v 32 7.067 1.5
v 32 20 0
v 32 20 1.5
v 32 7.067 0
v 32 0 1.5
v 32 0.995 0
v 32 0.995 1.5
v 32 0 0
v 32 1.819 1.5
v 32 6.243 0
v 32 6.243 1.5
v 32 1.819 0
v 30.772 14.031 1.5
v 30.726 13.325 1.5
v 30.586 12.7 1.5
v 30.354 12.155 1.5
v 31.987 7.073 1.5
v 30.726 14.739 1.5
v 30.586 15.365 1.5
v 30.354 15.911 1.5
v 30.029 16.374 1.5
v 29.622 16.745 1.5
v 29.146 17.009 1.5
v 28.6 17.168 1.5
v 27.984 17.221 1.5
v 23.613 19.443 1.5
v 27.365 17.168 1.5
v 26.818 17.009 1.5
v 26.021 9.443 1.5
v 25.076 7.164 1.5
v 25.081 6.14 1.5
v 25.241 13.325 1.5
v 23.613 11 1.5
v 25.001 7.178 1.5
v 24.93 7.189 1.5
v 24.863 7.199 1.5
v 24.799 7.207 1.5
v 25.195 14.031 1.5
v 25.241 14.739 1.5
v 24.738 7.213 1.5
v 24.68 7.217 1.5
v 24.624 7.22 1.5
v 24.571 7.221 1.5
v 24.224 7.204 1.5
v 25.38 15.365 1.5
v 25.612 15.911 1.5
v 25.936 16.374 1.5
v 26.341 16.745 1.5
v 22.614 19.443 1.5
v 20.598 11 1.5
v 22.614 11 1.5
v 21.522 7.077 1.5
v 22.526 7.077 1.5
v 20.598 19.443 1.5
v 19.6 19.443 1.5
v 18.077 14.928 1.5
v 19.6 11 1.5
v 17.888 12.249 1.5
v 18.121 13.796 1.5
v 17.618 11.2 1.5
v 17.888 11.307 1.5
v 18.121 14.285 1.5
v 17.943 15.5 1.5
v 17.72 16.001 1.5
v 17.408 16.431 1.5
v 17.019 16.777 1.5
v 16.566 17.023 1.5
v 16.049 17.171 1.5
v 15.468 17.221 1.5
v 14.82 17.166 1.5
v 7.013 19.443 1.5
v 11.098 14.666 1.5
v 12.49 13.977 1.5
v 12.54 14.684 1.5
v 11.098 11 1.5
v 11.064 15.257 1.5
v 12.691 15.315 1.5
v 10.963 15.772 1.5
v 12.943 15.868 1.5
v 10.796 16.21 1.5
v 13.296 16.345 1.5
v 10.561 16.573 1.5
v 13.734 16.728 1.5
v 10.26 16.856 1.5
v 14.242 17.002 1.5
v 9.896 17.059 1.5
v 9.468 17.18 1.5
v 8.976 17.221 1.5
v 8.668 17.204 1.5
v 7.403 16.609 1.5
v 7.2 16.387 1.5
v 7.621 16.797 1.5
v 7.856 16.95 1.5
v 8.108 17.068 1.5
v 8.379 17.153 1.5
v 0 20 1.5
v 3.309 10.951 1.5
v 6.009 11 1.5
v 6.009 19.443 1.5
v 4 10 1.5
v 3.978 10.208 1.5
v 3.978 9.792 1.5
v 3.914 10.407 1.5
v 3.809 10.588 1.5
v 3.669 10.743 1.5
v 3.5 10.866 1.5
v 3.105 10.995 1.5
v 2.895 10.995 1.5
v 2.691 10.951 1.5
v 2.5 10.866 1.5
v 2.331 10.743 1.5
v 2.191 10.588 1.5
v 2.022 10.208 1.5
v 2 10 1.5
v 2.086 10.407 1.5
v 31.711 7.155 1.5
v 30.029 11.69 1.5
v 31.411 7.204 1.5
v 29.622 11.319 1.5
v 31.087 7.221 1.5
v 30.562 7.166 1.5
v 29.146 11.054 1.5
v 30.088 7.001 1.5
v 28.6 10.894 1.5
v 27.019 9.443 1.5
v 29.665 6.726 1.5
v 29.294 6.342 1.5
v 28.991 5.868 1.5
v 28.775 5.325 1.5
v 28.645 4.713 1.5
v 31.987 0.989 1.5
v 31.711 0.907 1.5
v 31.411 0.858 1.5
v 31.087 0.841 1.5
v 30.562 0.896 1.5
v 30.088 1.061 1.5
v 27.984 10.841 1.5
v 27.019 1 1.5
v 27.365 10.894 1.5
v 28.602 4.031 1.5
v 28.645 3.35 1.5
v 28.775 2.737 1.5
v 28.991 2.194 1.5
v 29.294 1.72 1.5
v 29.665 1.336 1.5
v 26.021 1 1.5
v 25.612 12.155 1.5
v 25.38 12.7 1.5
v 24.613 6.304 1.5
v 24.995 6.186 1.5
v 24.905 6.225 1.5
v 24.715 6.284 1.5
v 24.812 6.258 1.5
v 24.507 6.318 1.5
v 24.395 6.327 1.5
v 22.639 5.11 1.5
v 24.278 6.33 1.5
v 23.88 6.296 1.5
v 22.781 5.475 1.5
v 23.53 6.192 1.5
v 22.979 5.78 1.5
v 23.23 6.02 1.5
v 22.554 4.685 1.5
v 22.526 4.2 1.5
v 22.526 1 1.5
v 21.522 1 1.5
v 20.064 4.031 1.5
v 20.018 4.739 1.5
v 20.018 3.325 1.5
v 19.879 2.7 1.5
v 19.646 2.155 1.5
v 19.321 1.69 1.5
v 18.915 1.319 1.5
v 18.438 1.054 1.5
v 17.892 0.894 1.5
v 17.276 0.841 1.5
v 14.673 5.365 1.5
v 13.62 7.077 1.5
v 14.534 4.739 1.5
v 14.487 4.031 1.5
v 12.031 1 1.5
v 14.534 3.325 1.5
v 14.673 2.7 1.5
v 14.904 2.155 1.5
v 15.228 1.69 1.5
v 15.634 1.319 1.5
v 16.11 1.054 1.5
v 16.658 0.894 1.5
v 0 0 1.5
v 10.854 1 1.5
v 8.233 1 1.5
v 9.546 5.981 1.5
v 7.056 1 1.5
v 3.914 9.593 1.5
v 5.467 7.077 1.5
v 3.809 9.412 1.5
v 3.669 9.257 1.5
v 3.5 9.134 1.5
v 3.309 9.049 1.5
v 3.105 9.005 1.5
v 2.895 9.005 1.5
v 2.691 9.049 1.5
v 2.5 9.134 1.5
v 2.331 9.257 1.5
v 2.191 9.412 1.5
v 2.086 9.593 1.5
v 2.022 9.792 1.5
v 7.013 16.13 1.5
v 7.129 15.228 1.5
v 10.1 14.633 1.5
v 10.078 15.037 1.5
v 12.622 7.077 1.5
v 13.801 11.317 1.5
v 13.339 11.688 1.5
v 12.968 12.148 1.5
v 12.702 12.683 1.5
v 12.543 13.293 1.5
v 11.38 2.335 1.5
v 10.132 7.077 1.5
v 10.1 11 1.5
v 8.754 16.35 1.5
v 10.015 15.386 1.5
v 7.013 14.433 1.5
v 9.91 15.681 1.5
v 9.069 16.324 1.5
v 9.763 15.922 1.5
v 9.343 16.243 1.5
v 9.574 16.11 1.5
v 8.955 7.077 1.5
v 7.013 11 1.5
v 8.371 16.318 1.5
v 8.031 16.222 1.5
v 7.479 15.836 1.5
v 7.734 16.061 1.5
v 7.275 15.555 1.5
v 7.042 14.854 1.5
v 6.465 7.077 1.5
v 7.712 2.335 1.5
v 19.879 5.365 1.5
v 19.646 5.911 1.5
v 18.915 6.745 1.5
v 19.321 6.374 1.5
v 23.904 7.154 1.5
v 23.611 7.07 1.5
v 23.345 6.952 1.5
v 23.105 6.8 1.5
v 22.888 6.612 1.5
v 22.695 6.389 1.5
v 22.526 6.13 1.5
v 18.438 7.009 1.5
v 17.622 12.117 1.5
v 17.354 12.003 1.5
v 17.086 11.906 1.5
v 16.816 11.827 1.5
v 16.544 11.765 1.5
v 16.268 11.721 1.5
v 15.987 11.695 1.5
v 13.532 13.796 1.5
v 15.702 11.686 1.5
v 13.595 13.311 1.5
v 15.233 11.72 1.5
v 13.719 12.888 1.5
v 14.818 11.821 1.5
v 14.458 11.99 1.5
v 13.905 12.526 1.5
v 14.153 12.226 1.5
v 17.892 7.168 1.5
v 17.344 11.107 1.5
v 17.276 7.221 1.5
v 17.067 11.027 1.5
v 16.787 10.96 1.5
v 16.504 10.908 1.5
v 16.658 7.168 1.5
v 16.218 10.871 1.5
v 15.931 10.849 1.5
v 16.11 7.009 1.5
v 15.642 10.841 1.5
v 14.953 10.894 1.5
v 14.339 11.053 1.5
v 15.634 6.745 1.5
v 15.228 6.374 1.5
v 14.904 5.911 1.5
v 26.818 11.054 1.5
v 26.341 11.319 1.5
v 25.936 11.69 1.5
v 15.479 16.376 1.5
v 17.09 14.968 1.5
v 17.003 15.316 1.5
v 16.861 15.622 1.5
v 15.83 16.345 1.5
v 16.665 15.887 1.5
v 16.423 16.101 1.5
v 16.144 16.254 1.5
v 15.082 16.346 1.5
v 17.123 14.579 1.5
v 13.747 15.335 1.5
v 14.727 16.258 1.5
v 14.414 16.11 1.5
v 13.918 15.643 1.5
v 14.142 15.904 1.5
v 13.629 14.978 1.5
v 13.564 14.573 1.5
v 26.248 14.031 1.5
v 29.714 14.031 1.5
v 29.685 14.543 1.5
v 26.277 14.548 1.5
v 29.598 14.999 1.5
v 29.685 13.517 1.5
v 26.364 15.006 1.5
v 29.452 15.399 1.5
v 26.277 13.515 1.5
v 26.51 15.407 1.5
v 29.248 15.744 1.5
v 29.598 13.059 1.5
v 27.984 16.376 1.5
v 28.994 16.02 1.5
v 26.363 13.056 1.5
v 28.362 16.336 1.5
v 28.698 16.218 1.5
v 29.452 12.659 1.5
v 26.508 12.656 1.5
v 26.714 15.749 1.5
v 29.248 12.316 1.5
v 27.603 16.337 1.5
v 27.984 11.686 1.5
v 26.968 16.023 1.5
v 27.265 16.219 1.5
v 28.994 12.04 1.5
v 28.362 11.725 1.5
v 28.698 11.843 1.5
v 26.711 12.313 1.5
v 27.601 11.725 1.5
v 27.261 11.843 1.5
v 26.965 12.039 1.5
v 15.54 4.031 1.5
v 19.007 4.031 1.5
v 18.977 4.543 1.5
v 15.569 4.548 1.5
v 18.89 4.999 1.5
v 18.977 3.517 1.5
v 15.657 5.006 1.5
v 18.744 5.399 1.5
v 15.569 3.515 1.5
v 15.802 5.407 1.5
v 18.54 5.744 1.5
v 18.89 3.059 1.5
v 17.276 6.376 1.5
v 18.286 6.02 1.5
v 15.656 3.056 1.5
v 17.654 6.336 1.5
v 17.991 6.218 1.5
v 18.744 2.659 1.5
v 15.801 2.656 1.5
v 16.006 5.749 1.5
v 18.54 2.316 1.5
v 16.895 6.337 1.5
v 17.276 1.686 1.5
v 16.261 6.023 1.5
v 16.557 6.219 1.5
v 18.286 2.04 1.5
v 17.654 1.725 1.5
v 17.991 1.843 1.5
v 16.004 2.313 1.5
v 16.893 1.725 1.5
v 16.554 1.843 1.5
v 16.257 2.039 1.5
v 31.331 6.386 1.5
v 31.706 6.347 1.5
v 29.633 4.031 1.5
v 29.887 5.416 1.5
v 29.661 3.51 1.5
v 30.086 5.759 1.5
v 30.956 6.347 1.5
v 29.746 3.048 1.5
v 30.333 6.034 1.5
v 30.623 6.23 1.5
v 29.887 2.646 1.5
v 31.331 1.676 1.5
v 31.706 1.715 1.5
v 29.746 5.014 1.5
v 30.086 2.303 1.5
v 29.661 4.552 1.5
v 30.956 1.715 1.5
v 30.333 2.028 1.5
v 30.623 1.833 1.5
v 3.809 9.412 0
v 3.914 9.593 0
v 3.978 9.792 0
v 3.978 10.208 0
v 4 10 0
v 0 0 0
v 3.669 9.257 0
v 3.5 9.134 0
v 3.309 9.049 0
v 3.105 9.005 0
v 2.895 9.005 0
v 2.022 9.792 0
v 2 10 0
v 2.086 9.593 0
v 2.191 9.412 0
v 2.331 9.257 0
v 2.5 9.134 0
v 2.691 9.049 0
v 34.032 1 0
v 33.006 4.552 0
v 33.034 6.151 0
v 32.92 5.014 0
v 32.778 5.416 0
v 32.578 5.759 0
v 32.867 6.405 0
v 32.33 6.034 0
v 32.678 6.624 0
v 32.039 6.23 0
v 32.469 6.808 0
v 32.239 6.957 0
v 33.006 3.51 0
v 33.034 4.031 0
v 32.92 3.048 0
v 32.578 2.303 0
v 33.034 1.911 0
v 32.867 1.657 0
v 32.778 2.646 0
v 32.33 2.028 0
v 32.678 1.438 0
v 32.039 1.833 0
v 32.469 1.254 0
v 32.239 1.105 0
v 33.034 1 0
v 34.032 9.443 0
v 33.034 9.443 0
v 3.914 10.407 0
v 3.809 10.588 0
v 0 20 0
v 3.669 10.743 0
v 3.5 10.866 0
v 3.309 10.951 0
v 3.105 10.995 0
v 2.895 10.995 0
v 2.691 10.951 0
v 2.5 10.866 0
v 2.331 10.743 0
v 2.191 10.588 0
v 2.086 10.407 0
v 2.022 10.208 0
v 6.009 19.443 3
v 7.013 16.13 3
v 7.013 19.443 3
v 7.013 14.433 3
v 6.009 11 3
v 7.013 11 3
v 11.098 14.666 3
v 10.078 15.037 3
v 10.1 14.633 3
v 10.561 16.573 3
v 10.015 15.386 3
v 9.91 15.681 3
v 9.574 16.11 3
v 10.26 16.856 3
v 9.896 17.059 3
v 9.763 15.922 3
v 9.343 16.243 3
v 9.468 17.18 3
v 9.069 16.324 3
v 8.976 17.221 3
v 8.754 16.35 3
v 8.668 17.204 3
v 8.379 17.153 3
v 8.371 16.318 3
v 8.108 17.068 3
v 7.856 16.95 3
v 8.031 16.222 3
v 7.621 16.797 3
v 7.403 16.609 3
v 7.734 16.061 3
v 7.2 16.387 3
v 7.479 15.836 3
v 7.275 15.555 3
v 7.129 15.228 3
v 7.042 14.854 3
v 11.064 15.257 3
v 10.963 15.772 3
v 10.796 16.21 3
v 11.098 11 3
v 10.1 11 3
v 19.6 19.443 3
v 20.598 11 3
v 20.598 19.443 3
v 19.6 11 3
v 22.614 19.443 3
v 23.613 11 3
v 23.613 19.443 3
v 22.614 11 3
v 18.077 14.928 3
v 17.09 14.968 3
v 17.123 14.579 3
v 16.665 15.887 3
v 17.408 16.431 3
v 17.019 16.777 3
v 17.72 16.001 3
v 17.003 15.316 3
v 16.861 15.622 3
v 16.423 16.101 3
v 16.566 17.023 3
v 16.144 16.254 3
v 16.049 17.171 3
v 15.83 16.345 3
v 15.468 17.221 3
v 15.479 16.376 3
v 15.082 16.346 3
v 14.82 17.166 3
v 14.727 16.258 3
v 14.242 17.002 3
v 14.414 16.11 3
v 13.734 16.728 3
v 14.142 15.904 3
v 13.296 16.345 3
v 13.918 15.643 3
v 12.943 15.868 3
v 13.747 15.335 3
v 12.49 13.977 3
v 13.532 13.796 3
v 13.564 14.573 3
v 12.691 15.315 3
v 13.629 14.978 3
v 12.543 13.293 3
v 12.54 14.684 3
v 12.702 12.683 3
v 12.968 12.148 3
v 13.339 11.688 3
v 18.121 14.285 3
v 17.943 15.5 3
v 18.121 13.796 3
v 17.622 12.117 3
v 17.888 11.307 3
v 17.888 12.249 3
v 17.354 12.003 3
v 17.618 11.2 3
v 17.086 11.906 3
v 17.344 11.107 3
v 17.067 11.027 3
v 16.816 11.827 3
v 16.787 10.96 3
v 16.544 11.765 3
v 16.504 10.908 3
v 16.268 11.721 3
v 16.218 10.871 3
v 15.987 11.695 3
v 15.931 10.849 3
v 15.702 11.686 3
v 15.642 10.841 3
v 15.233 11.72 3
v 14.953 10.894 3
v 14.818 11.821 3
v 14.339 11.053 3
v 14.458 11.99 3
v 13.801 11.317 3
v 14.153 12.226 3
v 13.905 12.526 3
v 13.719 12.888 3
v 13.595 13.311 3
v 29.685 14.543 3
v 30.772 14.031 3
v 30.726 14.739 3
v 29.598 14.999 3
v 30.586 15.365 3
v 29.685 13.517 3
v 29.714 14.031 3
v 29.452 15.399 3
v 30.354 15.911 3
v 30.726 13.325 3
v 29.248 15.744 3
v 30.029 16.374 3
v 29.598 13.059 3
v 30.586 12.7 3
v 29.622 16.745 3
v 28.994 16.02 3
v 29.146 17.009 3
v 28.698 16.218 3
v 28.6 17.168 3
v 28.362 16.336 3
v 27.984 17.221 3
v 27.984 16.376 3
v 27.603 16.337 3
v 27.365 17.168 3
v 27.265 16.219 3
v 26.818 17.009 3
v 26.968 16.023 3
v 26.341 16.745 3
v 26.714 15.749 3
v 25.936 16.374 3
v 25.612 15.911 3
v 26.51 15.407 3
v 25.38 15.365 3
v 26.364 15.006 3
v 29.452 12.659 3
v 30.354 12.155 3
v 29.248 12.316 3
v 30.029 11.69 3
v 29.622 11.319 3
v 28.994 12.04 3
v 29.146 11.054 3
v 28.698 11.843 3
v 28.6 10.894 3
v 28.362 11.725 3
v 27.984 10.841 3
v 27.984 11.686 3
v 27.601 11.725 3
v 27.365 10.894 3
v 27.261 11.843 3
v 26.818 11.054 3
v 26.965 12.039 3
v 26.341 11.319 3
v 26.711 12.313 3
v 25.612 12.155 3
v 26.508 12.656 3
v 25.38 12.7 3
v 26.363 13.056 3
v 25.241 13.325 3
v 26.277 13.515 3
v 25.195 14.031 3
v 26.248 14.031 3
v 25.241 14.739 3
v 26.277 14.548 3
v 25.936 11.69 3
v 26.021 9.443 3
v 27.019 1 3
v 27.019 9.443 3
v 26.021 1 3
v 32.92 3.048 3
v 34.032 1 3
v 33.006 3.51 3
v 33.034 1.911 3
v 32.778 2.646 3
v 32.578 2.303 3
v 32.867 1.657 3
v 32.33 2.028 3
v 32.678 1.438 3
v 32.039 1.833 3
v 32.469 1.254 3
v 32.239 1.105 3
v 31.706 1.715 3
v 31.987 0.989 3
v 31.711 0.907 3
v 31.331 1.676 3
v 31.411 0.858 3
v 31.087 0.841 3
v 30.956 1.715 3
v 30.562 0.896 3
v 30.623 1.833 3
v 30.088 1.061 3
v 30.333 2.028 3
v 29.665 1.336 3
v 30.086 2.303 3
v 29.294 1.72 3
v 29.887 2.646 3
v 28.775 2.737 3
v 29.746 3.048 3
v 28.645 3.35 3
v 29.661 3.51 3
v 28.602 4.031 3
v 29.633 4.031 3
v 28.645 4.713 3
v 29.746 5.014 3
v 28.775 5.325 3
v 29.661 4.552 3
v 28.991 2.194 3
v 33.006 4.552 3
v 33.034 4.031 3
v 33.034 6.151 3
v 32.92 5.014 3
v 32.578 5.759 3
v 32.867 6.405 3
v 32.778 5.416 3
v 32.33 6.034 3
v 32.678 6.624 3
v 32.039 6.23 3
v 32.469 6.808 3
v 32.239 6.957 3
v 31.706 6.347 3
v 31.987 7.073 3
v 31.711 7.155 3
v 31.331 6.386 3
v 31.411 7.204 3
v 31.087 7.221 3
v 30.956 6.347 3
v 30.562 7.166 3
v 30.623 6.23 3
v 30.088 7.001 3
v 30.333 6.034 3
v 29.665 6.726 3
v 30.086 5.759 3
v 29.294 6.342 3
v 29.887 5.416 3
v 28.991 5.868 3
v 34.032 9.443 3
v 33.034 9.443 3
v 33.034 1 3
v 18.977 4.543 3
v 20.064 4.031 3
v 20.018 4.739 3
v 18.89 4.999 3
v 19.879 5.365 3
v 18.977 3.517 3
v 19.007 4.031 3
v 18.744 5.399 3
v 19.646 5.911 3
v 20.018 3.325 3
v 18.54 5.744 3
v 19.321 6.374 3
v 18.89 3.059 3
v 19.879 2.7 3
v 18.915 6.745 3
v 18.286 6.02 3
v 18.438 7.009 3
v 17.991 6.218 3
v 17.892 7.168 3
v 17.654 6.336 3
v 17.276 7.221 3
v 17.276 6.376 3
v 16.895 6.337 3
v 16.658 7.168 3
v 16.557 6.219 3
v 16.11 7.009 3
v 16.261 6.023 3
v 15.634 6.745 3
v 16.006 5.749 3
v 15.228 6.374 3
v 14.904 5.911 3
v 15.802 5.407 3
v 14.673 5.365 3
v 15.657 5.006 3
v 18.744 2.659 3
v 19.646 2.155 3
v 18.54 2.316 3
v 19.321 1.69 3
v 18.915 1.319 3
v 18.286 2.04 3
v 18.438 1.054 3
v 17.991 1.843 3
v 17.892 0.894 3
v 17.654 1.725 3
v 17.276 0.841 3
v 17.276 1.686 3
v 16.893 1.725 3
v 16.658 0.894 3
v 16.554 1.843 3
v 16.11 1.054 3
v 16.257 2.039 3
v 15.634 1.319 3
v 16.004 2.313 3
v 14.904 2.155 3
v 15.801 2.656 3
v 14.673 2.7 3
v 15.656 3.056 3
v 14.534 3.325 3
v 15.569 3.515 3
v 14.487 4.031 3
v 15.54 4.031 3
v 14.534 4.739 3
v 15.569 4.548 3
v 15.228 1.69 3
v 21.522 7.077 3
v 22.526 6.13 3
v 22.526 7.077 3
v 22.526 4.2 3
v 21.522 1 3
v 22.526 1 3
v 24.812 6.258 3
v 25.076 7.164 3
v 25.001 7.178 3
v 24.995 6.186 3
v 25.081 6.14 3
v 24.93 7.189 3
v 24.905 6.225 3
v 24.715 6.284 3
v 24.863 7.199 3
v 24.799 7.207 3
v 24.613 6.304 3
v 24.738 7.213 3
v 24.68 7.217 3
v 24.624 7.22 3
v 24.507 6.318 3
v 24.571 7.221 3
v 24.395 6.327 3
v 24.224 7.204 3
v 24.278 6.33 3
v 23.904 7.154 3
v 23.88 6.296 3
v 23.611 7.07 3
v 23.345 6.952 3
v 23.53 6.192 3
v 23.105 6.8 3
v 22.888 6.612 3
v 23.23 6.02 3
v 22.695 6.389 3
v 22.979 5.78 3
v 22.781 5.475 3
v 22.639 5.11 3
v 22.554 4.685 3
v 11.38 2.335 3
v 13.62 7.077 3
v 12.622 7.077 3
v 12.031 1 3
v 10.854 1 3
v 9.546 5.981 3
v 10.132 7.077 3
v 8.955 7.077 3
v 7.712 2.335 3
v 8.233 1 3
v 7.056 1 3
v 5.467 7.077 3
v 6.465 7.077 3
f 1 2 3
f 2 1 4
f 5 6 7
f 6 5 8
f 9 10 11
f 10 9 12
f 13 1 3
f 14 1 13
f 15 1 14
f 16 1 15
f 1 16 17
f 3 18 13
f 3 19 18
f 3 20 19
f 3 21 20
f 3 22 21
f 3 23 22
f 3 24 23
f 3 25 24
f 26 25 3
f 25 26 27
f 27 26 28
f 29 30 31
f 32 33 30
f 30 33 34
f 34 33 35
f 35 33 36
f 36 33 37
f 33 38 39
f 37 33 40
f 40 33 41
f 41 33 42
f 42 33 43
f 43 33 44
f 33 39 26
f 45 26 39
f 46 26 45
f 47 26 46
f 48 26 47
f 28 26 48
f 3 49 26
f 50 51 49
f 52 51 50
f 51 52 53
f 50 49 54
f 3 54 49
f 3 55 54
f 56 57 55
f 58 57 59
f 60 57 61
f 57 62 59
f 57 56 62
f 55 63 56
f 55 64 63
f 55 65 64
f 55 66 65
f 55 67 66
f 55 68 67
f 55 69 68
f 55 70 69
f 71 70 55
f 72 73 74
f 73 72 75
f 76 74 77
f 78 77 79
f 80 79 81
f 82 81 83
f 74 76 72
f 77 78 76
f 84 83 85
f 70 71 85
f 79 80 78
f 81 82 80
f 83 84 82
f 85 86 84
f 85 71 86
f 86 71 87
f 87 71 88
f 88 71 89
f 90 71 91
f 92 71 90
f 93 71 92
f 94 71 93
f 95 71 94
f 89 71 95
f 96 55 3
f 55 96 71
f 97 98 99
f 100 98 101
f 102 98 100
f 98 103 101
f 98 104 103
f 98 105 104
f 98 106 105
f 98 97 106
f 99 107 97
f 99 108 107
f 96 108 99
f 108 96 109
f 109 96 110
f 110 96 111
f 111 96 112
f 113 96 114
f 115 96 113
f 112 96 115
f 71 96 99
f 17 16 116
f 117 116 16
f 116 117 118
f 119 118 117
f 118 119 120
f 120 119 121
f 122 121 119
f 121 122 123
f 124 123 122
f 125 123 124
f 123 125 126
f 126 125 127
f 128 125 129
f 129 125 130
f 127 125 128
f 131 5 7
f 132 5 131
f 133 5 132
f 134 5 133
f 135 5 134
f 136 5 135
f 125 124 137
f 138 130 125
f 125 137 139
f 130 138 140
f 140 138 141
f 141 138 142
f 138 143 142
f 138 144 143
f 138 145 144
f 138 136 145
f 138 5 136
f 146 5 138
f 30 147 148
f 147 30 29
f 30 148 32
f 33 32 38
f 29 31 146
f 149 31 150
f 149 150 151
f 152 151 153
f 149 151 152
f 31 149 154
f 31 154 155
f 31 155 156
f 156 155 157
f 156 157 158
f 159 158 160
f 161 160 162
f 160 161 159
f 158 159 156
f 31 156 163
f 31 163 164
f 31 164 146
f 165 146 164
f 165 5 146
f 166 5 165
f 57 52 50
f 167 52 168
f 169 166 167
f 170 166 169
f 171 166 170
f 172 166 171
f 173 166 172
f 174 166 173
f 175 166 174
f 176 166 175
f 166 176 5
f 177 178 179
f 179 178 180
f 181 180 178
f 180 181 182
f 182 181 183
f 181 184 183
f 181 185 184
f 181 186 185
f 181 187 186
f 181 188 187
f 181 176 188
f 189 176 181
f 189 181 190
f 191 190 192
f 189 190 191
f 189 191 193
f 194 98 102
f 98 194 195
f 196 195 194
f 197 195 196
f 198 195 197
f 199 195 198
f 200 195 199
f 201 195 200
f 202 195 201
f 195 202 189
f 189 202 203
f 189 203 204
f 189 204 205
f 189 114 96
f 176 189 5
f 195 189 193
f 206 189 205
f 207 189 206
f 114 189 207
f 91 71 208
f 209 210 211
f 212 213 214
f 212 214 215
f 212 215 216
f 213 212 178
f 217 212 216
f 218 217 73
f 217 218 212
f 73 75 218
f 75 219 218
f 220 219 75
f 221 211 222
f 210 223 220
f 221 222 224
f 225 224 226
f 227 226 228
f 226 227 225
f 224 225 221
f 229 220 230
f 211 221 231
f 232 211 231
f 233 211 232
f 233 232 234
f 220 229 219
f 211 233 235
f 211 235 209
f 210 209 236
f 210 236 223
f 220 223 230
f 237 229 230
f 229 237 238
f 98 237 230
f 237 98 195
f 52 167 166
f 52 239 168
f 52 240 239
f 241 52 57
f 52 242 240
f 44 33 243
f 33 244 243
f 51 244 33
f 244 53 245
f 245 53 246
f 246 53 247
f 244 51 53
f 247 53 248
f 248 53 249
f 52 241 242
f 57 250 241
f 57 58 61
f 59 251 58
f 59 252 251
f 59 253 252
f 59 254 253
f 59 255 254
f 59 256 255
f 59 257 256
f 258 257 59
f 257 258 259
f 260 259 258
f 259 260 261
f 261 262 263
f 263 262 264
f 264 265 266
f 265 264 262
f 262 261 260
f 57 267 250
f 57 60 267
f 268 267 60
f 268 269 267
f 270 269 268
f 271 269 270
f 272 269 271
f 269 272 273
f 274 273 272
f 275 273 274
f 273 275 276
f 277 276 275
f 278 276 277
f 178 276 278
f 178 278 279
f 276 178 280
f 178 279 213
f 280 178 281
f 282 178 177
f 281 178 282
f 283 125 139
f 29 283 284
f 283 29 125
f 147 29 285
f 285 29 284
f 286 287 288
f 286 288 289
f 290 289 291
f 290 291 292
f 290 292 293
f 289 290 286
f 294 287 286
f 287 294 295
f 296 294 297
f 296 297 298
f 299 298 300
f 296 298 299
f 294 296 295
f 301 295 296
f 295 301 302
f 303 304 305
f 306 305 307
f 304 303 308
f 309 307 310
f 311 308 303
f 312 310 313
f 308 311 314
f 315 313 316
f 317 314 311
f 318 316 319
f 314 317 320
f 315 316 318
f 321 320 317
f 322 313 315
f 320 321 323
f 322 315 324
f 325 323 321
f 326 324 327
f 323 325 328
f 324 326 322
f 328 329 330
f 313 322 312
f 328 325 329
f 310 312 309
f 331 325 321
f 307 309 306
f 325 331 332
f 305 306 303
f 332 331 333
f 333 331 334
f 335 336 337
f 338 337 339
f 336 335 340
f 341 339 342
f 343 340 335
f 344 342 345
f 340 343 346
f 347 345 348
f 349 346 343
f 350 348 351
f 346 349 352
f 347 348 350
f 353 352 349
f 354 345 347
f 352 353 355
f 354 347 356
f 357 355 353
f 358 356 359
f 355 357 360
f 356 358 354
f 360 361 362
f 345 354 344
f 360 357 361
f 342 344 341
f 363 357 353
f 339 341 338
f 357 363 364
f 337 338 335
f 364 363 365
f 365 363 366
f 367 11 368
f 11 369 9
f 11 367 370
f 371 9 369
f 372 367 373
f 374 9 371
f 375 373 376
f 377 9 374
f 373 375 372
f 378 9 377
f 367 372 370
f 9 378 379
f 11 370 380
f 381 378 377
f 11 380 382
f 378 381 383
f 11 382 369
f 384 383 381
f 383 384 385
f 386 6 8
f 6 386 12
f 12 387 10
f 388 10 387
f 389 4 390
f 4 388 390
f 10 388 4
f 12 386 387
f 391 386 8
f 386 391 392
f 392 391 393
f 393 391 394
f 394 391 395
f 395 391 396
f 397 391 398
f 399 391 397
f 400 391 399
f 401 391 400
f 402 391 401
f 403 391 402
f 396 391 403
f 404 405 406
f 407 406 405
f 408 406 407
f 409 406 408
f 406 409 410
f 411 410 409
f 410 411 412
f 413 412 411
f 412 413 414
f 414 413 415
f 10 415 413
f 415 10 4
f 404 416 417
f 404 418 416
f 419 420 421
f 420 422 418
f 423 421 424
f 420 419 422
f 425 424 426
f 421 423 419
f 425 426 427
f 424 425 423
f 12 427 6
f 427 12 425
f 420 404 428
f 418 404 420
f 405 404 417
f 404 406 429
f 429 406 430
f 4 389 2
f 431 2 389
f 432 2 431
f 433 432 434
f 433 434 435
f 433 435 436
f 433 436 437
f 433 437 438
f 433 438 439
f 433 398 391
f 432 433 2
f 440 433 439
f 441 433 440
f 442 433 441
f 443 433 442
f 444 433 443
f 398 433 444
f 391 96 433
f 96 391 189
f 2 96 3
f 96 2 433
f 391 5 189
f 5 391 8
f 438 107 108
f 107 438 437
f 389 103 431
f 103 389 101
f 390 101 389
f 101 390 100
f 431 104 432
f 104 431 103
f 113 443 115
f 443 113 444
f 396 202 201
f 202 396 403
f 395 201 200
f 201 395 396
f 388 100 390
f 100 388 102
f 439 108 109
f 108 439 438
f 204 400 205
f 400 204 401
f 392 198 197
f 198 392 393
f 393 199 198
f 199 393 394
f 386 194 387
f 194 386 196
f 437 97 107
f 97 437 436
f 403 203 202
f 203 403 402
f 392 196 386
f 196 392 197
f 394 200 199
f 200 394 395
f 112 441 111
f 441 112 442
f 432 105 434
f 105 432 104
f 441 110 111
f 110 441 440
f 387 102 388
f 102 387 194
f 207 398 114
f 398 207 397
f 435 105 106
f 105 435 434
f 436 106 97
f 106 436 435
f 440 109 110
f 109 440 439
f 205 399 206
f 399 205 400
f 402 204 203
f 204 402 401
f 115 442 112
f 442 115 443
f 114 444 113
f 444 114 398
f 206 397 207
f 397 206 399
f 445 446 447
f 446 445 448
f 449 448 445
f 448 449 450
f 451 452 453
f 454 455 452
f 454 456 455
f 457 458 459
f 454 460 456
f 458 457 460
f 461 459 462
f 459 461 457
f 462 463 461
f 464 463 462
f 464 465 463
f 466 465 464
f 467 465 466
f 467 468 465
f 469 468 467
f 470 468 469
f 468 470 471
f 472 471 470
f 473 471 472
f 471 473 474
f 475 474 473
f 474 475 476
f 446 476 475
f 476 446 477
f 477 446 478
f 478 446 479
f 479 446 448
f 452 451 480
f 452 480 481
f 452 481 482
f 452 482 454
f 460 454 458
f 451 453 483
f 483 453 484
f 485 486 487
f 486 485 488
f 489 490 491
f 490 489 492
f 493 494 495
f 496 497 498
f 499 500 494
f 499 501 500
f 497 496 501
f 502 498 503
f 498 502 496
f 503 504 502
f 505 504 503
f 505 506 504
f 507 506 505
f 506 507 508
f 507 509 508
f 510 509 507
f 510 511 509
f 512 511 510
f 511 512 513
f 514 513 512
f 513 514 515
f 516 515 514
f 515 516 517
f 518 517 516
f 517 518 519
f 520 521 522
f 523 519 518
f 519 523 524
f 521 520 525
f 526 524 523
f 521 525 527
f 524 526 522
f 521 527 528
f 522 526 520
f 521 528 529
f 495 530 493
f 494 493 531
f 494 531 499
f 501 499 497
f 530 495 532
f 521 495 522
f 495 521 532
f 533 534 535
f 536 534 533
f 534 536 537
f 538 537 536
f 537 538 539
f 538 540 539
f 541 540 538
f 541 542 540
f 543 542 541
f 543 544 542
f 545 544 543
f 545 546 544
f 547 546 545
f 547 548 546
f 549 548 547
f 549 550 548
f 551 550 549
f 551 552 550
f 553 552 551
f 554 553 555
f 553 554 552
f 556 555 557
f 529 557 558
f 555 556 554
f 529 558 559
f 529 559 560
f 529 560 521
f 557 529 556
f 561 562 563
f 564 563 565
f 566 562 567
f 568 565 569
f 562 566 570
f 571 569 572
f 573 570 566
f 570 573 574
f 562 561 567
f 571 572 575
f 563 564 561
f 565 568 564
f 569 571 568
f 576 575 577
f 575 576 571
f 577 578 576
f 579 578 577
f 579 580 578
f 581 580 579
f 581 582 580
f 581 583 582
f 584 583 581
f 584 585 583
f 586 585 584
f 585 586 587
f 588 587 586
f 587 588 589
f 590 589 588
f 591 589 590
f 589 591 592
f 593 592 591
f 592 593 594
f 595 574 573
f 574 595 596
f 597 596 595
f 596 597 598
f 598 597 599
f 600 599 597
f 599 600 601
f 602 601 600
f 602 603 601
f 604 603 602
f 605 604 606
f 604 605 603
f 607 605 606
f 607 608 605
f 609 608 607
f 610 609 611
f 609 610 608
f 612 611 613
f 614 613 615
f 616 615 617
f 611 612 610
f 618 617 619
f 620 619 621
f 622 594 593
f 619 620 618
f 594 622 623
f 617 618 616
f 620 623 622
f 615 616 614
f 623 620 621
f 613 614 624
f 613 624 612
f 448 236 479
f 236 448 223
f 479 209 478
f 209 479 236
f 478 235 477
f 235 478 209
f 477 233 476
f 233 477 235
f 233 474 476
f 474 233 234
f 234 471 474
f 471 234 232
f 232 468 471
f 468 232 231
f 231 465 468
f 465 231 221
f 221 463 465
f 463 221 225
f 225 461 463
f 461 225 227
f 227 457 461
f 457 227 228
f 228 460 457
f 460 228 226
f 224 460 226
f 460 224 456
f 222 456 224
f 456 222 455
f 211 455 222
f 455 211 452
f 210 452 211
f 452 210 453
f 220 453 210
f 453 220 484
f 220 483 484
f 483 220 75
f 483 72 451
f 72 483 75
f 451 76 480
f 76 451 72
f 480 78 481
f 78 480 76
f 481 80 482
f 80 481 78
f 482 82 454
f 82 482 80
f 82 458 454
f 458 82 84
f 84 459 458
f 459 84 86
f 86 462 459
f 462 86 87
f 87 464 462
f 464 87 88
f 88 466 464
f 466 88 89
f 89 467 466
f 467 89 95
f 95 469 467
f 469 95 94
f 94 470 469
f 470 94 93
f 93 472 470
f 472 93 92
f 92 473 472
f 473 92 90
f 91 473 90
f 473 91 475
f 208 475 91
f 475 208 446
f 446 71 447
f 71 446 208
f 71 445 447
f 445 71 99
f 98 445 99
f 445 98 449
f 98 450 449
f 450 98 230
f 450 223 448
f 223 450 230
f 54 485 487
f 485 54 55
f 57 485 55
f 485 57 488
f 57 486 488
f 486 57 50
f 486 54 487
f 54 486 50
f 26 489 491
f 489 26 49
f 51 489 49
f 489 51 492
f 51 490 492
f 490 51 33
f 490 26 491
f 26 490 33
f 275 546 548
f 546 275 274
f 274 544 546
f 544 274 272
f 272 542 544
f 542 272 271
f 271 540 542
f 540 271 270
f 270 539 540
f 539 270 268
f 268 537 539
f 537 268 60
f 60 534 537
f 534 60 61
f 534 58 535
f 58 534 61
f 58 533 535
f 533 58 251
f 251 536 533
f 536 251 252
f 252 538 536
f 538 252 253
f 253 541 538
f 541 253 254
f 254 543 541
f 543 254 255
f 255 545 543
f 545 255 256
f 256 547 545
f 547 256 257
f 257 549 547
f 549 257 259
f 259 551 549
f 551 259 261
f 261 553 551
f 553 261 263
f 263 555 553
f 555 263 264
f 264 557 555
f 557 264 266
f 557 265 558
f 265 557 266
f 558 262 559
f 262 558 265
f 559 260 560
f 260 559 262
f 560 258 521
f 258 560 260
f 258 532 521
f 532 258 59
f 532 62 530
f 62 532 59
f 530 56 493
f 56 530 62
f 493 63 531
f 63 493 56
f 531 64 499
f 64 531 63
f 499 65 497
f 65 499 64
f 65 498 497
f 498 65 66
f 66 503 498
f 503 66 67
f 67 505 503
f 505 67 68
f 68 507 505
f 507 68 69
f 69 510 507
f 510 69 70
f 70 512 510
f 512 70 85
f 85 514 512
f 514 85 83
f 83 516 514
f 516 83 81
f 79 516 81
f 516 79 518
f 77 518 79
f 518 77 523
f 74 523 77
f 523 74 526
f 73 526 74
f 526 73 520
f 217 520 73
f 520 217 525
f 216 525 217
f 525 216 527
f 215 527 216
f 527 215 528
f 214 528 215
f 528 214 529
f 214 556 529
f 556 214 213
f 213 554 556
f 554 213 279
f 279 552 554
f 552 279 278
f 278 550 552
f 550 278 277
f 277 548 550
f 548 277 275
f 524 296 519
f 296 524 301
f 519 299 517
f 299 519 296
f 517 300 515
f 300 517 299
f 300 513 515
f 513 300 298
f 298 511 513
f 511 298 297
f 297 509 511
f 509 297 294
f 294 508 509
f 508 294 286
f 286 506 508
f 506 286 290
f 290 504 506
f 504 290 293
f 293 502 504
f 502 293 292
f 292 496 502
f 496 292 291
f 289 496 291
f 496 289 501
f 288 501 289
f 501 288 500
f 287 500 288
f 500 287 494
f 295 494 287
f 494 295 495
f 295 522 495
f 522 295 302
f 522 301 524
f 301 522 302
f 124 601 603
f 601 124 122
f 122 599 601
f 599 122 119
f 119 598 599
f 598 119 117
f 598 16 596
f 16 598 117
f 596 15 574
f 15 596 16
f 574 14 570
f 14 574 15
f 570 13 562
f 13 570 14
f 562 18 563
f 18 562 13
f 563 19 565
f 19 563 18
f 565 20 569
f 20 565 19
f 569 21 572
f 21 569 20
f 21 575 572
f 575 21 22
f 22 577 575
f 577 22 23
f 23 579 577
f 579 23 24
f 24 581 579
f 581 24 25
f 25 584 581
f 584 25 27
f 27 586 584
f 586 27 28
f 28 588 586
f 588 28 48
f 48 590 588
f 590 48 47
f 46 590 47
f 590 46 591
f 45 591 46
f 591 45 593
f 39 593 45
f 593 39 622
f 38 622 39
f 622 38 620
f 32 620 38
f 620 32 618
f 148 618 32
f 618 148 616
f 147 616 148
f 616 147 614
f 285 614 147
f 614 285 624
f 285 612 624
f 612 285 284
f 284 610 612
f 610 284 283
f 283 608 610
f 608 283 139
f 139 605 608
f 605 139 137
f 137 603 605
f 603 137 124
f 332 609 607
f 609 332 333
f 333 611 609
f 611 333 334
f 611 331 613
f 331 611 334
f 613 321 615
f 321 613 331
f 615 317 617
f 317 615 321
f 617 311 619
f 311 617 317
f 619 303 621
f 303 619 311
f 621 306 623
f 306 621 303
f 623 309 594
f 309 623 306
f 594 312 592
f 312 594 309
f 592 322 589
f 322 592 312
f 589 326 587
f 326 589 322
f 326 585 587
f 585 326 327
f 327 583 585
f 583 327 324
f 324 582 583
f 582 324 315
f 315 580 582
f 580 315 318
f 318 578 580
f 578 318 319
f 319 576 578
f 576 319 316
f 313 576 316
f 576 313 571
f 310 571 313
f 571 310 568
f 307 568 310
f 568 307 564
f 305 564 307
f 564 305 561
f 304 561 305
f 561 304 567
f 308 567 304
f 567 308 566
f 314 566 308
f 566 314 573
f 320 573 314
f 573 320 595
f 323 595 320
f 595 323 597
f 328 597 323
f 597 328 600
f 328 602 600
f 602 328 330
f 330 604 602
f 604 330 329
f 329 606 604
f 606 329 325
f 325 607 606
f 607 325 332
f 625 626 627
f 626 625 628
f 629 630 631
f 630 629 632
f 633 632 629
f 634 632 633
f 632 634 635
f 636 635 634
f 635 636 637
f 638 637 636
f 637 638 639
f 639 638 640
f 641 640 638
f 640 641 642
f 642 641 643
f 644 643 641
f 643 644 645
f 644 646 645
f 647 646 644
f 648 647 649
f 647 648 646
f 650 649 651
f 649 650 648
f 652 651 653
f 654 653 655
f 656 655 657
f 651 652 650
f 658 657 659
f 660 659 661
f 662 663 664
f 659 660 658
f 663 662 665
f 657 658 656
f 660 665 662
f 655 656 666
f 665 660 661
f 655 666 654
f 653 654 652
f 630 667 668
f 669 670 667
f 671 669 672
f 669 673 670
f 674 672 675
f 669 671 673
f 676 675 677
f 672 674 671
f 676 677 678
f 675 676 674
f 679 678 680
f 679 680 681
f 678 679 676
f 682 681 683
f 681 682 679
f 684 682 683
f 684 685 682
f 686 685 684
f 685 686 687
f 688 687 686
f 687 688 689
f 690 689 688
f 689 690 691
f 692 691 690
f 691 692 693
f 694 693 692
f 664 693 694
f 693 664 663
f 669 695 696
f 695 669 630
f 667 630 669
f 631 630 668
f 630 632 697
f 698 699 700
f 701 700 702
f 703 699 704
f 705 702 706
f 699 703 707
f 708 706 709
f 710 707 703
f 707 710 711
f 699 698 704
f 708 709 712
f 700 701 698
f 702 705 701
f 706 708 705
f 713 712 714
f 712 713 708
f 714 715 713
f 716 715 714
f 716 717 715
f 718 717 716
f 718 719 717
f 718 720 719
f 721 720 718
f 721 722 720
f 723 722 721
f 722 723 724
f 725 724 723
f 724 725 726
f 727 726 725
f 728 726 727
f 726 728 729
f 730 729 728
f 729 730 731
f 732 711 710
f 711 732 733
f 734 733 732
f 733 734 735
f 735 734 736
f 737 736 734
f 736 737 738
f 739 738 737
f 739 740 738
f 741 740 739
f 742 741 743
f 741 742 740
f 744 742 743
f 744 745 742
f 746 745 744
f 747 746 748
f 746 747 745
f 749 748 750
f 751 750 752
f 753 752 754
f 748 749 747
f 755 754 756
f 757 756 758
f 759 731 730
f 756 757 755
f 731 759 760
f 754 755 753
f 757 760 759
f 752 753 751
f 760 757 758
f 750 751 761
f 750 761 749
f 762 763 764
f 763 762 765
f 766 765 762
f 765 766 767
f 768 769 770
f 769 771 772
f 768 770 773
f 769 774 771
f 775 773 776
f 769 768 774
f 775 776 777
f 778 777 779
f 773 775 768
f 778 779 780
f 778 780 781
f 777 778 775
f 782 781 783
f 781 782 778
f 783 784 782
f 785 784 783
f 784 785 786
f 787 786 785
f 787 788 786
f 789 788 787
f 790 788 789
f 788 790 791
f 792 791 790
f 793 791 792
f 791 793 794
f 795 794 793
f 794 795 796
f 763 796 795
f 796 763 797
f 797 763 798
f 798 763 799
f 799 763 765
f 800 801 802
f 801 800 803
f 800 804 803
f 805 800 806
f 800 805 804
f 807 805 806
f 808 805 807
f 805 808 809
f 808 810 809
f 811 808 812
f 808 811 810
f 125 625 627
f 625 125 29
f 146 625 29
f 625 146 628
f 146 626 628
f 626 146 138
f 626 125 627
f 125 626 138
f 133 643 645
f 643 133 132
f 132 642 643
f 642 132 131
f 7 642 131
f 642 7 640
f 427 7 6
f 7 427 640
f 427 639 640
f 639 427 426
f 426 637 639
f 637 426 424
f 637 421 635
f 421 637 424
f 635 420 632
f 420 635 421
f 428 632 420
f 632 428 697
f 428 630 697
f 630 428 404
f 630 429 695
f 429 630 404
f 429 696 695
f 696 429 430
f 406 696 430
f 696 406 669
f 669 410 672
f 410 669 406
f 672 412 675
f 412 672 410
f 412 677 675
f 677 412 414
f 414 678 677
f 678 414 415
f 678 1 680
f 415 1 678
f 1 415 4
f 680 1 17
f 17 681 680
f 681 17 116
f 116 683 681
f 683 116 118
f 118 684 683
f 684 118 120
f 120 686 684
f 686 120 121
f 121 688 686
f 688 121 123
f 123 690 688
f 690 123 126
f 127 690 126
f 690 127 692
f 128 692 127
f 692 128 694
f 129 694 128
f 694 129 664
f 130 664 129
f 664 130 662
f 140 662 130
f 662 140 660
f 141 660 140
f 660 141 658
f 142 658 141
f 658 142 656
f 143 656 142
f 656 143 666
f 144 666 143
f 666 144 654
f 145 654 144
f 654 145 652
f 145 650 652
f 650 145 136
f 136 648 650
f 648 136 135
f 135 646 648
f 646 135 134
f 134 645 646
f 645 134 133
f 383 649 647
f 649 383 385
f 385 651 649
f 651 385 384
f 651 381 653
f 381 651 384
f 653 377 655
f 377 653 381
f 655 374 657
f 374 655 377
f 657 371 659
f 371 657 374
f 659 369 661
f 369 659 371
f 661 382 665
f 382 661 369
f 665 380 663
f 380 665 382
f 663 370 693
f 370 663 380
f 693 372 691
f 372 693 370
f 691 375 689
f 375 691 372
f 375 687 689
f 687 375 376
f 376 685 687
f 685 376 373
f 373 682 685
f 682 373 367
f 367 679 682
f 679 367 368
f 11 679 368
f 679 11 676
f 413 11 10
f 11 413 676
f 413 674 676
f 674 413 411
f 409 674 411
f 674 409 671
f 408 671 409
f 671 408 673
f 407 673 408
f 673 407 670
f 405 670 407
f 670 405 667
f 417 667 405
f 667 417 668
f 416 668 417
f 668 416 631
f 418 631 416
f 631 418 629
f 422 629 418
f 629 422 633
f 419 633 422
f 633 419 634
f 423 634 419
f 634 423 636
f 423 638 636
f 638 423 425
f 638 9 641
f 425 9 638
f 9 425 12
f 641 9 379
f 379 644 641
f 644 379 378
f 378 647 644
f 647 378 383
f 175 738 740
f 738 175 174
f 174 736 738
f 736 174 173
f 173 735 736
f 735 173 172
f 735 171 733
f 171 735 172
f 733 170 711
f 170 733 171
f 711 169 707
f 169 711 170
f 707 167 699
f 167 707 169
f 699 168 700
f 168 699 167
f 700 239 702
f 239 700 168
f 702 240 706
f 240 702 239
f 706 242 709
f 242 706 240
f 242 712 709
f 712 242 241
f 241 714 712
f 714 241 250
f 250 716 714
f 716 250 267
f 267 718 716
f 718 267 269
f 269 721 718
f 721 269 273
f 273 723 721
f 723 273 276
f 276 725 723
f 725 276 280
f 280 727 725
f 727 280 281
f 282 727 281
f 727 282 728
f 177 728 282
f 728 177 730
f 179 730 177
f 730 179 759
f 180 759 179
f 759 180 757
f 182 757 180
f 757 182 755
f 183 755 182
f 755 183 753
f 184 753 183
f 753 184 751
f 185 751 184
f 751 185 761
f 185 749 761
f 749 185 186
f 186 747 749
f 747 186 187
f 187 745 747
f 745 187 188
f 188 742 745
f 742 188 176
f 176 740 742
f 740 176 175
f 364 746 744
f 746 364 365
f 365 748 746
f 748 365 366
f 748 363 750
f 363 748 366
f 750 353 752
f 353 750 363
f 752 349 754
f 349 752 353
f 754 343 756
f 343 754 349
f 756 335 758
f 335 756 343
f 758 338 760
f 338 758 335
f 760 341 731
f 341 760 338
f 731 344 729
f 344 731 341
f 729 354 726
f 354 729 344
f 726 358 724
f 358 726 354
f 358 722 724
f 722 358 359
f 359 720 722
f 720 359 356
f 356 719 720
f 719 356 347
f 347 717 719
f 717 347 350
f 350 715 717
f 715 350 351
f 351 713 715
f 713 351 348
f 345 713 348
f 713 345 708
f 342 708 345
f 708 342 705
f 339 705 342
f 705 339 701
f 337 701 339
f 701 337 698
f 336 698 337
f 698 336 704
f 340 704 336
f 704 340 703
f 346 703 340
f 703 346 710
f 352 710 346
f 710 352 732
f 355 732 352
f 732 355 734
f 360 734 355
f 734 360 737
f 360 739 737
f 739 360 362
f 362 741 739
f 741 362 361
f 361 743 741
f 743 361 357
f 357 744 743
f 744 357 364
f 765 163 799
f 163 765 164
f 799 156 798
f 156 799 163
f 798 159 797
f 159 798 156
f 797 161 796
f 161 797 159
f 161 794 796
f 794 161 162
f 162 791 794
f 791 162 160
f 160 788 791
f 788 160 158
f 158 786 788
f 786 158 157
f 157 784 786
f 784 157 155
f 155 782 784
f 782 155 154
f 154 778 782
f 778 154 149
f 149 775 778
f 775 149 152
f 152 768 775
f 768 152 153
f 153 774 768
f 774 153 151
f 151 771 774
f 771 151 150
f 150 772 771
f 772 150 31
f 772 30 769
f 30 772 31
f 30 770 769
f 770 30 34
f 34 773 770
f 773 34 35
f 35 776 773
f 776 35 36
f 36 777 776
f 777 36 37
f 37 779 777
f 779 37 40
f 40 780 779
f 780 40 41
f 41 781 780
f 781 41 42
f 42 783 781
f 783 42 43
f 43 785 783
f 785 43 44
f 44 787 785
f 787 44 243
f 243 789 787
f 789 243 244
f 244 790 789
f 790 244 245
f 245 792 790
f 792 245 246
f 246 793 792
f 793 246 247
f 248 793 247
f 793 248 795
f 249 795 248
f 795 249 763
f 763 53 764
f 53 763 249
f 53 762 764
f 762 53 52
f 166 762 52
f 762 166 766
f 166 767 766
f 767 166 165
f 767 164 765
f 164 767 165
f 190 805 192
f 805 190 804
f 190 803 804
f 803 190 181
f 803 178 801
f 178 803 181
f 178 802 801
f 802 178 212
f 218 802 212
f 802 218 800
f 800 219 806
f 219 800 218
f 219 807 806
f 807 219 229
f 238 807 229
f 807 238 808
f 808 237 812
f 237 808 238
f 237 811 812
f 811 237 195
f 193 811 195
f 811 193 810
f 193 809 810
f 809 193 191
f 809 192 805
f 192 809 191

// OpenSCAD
union() {
	union() {
		difference() {
			cube(size = [32, 20, 1.5000000000]);
			translate(v = [3, 10, 0]) {
				scale(v = [0.1000000000, 0.1000000000, 1]) {
					cylinder(h = 10, r = 10);
				}
			}
		}
		linear_extrude(height = 3) {
			translate(v = [5, 11, 0]) {
				text(font = "Roboto:style=Black", size = 8, text = "hello");
			}
		}
	}
	linear_extrude(height = 3) {
		translate(v = [5, 1, 0]) {
			text(font = "Roboto:style=Black", size = 8, text = "world");
		}
	}
}
/***********************************************
*********      SolidPython code:      **********
************************************************
 
from solid import *
from subprocess import run

d = cube([32, 20, 1.5]) - \
    translate([3, 10, 0])(
        scale([0.1, 0.1, 1])(
            cylinder(h=10, r=10))) + \
    linear_extrude(3)(
        translate([5, 11, 0])(
            text('hello', size=8, font='Roboto:style=Black'))) + \
    linear_extrude(3)(
        translate([5, 1, 0])(
            text('world', size=8, font='Roboto:style=Black')))

scad_render_to_file(d, 'hello_world.scad')
exec('run (["openscad", "-o", "{}", "{}"])'.format('hello_world.stl', 'hello_world.scad')) 
 
************************************************/
